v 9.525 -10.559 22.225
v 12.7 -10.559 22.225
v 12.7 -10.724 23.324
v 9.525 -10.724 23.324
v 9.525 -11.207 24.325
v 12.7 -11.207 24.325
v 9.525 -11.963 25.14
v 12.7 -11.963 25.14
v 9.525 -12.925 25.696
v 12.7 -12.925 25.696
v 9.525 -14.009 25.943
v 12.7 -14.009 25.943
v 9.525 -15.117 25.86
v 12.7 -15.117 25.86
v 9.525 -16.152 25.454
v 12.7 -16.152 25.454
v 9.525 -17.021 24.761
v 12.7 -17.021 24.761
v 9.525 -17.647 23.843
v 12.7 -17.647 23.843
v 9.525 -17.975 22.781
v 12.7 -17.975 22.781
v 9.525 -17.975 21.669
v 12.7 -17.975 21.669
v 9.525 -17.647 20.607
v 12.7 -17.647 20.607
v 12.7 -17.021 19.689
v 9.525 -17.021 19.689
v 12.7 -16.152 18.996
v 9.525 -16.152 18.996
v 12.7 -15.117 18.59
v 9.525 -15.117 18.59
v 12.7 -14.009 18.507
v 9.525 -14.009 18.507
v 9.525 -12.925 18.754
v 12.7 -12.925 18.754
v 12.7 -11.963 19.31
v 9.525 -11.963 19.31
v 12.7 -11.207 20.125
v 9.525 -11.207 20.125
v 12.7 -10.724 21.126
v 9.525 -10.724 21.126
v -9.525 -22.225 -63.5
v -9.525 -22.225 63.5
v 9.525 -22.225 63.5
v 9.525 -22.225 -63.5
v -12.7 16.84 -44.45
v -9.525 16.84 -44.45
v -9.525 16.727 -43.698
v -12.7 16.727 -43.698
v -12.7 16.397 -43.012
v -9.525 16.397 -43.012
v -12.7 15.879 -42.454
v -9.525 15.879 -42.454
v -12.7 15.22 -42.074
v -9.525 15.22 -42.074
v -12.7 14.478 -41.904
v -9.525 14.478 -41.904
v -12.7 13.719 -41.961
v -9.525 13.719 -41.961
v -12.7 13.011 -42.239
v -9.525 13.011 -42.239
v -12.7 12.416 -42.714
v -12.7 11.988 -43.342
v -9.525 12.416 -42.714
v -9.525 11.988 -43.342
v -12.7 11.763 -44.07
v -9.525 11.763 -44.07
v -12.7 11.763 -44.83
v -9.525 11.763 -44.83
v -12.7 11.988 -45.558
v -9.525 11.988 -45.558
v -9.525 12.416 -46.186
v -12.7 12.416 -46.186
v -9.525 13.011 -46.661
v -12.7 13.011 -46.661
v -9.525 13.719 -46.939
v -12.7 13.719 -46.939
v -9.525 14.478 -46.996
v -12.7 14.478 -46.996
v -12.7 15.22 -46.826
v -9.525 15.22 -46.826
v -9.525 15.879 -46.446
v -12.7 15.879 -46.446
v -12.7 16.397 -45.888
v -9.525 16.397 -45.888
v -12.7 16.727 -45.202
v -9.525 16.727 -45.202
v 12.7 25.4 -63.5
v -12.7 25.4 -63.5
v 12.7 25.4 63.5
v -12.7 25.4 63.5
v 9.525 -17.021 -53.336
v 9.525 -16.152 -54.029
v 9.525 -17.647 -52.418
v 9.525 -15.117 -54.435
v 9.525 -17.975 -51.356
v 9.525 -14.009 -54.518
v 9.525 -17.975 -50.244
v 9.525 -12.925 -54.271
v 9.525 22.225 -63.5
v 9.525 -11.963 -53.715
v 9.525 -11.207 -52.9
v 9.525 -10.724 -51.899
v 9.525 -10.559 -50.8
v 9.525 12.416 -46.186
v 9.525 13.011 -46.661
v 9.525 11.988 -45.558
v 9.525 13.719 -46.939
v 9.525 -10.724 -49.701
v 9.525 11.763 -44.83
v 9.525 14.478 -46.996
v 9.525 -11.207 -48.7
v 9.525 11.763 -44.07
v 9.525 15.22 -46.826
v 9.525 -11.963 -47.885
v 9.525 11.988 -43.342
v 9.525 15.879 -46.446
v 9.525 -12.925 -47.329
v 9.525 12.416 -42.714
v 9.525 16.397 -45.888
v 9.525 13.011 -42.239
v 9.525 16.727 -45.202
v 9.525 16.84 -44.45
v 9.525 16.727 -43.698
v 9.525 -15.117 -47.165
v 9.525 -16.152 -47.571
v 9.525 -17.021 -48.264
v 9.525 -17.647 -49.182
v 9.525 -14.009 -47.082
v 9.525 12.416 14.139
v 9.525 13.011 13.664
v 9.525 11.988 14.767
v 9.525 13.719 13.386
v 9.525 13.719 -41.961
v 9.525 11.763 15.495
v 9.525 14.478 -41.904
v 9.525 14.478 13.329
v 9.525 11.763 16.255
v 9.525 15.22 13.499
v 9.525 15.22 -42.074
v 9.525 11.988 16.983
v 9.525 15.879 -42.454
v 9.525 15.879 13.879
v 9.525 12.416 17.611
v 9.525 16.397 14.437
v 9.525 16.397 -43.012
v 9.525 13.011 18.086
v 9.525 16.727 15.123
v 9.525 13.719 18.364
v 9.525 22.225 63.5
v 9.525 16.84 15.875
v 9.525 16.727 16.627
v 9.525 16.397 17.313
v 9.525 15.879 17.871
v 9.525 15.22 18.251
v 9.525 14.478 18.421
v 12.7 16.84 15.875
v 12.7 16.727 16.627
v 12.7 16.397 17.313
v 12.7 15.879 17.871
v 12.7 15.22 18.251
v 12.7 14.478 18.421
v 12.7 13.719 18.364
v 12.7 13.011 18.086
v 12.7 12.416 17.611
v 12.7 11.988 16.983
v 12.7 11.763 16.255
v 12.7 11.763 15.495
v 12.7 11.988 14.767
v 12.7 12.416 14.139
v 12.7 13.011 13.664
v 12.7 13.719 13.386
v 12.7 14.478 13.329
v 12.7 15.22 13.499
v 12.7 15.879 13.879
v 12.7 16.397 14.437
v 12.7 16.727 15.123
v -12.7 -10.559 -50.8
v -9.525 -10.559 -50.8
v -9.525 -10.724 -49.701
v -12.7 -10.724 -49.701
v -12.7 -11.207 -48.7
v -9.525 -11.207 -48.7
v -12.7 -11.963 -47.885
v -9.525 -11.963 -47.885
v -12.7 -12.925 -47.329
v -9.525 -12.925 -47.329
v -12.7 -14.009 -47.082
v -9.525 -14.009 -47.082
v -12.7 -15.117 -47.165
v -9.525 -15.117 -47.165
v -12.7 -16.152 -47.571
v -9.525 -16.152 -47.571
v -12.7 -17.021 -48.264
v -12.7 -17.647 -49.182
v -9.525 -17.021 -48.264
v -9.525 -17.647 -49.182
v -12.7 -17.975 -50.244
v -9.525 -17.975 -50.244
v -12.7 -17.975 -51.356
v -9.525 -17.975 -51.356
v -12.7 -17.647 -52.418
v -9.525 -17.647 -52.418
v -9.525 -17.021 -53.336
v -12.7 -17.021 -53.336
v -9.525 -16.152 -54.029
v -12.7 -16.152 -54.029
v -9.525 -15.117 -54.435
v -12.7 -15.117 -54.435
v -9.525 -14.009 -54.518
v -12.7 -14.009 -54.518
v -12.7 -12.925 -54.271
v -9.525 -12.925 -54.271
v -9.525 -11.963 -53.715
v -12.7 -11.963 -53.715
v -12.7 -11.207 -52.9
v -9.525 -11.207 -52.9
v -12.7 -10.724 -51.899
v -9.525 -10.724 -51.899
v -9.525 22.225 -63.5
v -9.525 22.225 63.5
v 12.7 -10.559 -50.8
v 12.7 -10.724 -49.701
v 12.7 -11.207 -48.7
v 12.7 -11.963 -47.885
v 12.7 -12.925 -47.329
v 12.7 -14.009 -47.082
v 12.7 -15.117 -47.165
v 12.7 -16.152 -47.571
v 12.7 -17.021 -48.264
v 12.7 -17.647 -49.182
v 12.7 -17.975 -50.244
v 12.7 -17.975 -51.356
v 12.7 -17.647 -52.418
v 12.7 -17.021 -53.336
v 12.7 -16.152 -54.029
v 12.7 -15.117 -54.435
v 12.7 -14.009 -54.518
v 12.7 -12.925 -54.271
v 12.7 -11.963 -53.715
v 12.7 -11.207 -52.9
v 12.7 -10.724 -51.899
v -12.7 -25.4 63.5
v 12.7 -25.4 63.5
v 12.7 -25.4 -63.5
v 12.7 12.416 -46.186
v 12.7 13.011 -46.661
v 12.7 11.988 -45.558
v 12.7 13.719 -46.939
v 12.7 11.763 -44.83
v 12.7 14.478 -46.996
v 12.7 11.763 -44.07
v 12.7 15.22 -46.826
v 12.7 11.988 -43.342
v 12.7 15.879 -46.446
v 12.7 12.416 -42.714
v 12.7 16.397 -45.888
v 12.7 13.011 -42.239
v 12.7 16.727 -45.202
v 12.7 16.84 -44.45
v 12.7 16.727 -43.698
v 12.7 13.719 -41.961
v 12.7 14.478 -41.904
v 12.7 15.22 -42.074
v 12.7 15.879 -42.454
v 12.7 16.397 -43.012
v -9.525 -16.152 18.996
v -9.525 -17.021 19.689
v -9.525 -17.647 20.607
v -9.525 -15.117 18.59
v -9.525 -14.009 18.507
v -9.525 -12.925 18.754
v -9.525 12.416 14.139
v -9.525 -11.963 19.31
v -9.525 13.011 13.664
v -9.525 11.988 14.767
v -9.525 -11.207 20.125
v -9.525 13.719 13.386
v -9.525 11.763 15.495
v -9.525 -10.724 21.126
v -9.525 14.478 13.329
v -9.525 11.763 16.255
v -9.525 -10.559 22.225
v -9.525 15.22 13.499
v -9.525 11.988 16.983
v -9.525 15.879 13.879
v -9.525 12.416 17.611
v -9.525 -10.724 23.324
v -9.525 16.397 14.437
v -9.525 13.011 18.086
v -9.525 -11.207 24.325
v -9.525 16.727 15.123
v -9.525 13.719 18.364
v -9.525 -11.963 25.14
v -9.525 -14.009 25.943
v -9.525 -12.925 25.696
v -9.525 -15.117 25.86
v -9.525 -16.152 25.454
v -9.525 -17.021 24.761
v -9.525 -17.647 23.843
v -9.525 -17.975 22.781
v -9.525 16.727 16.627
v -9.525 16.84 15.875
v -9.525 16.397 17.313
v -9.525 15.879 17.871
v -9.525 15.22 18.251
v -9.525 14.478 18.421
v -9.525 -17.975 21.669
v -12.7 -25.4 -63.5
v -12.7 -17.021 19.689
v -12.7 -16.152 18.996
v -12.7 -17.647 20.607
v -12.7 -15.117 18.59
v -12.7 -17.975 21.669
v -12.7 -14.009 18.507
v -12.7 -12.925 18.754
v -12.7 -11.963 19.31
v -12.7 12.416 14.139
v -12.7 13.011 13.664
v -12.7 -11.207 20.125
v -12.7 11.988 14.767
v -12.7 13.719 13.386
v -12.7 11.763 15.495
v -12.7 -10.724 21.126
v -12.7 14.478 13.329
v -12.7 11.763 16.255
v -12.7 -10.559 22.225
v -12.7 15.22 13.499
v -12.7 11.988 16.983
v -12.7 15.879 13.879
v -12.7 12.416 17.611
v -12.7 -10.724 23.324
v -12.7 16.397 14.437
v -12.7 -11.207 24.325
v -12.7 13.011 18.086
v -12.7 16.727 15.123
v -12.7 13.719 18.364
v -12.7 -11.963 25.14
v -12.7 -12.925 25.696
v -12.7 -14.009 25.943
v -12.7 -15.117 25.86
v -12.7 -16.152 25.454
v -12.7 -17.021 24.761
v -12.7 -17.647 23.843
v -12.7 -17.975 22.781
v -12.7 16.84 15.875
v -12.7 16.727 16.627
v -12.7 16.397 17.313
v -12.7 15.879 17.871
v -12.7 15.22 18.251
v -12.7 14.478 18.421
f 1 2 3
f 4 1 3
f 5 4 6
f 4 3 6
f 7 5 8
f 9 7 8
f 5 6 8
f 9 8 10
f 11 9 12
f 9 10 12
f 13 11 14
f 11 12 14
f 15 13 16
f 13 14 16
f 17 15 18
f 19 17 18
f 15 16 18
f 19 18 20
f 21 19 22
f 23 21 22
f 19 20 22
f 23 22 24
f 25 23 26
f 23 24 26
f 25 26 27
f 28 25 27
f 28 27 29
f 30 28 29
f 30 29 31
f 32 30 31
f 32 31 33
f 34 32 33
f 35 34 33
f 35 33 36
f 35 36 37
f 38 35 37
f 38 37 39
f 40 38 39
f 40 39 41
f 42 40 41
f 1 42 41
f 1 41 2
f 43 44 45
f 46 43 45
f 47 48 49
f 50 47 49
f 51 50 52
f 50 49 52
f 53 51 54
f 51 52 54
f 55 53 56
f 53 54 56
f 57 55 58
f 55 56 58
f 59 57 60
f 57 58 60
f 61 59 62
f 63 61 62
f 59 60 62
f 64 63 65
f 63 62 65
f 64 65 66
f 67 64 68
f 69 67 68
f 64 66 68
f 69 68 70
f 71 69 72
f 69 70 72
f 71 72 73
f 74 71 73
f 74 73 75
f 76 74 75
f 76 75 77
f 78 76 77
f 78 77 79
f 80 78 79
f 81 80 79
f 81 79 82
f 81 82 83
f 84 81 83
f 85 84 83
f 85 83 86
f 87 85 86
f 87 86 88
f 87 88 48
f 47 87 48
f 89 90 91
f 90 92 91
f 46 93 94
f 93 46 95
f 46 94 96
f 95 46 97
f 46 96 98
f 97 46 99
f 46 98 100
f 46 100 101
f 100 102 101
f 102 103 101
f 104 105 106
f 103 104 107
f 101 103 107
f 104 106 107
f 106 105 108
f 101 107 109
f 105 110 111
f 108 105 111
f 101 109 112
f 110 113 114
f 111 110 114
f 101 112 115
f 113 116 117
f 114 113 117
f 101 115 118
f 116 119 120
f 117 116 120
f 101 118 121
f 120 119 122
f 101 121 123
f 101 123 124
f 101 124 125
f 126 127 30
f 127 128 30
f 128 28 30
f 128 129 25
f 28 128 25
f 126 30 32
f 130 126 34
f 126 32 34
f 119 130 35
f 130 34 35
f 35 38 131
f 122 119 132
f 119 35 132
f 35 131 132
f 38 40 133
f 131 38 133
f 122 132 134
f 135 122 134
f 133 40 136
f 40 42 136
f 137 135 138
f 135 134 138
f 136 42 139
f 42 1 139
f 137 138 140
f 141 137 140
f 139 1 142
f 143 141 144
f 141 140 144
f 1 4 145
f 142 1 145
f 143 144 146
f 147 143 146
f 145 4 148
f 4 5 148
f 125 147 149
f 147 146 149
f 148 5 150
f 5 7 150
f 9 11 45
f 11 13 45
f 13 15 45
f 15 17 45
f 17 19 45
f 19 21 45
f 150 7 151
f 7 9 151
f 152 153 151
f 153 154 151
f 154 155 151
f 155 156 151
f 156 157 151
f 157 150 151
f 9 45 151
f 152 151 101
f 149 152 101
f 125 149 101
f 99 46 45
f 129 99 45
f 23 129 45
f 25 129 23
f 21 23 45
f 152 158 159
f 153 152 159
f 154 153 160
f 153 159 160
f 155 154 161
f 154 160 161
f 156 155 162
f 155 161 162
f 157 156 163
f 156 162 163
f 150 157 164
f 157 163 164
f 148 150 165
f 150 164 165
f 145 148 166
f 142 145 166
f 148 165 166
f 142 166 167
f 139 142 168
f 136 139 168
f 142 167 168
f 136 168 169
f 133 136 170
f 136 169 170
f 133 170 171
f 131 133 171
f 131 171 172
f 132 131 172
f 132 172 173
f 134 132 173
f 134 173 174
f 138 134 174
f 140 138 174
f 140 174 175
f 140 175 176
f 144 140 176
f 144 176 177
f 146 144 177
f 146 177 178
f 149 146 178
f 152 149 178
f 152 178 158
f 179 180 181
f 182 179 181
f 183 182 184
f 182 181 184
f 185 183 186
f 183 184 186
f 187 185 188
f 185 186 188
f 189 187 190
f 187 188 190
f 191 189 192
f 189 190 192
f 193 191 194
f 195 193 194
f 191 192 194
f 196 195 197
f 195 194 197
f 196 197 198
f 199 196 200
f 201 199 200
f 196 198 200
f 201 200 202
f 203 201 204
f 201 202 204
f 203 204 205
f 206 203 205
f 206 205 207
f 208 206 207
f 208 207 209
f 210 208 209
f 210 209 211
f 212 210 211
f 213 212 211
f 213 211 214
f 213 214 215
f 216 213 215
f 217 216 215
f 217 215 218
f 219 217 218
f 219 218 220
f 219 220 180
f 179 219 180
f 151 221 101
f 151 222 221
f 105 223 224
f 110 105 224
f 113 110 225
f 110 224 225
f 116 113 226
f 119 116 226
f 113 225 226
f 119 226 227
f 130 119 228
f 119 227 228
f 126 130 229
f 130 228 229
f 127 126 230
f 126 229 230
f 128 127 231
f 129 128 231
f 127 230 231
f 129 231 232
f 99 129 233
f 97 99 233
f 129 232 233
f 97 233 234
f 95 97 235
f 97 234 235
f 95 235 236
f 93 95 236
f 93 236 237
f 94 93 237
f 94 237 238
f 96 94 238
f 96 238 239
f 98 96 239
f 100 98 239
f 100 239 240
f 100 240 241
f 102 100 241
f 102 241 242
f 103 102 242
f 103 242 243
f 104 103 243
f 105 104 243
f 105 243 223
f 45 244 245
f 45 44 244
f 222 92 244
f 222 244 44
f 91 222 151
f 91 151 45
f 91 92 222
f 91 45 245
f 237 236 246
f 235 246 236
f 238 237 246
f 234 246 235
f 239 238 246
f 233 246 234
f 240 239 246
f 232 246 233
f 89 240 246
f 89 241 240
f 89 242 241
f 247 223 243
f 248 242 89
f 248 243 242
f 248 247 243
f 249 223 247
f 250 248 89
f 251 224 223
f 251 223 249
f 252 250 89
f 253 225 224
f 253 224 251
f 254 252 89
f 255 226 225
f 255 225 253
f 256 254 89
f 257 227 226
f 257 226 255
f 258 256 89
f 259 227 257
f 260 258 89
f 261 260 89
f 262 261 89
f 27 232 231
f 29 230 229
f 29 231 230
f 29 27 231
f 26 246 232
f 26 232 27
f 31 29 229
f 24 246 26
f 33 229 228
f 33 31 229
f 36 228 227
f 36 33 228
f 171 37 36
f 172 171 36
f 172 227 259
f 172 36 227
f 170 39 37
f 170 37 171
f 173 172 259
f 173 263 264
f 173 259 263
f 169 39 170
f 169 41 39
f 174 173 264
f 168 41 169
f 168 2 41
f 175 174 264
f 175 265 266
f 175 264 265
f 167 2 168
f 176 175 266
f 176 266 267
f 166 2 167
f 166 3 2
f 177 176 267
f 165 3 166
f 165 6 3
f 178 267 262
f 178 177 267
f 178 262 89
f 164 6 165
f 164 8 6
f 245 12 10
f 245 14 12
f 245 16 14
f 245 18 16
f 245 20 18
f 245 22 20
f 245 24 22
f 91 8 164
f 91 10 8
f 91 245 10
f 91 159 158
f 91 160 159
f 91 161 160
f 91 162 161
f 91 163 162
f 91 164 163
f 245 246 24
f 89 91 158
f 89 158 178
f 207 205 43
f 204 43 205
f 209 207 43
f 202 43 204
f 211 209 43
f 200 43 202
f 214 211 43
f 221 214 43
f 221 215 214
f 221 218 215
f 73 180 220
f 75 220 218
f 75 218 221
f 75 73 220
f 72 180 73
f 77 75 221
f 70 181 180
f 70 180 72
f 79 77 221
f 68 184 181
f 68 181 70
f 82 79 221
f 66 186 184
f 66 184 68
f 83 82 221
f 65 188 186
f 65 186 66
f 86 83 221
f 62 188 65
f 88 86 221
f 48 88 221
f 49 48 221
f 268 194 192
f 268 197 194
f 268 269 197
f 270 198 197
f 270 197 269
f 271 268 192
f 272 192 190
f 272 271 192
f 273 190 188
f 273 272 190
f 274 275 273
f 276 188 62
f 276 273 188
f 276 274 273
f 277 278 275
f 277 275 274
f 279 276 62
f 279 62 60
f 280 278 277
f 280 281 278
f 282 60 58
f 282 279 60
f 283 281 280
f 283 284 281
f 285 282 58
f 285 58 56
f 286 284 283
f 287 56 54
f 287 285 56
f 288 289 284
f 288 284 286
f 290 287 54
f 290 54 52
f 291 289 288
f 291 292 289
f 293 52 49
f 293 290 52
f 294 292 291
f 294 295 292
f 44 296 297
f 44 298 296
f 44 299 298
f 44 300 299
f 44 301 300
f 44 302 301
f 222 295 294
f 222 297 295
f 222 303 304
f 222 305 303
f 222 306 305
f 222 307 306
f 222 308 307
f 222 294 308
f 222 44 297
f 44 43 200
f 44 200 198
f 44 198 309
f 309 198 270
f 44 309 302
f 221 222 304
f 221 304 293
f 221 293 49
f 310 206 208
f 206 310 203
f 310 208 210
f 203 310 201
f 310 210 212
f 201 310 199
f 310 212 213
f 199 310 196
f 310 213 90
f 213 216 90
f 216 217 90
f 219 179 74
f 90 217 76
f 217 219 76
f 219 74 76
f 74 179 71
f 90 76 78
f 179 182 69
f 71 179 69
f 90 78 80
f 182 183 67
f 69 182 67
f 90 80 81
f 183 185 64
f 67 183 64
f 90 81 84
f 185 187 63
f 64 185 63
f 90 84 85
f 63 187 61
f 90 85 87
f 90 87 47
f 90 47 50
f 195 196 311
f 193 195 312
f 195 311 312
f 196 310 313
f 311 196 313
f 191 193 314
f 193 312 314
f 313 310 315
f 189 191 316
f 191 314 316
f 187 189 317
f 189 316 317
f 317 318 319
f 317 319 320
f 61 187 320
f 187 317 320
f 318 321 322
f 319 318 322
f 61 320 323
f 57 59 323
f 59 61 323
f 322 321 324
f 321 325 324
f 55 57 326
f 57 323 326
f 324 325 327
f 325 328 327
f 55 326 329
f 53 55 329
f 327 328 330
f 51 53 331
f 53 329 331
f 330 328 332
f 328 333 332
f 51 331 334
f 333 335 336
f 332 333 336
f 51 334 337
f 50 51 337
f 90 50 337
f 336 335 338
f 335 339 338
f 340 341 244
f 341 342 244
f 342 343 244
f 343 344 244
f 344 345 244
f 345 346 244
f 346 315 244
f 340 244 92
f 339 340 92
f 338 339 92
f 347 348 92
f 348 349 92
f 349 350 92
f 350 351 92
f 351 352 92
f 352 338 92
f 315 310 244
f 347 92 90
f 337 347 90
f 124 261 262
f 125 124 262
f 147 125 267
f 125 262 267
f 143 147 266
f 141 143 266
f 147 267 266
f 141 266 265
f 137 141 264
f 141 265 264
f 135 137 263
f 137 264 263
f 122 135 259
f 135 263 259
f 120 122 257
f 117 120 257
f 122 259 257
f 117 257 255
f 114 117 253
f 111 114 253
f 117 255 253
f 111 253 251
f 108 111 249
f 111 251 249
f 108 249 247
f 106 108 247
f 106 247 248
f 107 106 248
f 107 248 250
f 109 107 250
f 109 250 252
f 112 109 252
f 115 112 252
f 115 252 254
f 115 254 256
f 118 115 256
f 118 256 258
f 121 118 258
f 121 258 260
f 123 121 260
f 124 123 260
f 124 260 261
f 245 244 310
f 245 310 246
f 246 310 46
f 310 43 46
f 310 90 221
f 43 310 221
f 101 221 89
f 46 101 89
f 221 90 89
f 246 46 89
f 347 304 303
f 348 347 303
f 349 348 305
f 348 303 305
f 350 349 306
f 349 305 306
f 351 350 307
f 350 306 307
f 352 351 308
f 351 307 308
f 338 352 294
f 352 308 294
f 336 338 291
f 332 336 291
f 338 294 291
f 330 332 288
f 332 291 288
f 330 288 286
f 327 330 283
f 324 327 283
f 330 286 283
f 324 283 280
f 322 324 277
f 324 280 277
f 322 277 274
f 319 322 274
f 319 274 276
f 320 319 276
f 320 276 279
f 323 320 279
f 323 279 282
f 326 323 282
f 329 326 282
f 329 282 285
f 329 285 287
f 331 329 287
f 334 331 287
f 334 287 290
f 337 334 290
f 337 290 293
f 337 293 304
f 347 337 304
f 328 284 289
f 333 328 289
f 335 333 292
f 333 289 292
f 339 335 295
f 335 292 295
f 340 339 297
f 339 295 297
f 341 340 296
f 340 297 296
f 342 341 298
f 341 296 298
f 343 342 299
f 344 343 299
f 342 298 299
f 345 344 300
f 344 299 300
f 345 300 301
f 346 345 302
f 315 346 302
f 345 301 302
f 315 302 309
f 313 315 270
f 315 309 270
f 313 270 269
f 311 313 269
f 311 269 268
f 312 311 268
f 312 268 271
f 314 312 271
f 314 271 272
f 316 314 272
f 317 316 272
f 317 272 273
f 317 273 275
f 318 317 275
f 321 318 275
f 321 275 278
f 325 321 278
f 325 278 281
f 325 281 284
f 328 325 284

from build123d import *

# Parameters (mm, degrees)
SKETCH1_W           = 25.4
SKETCH1_H           = 50.8
SKETCH1_W_2         = 19.05
SKETCH1_H_2         = 44.45
BOSS_EXTRUDE1_DEPTH = 63.5
SKETCH3_R           = 3.72872
SKETCH3_R_2         = 2.5527
CUT_EXTRUDE1_DEPTH  = 73.955945611


with BuildPart() as part:
    # Sketch1 → Boss-Extrude1 (new, symmetric)
    with BuildSketch(Plane.XY):
        Rectangle(SKETCH1_W, SKETCH1_H)
        Rectangle(SKETCH1_W_2, SKETCH1_H_2, mode=Mode.SUBTRACT)
    extrude(amount=BOSS_EXTRUDE1_DEPTH, both=True)

    # Sketch3 → Cut-Extrude1 (cut, through all)
    with BuildSketch(Plane(origin=(12.7, 0, 0), x_dir=(0, 0, -1), z_dir=(1, 0, 0))):
        with Locations(Location((50.8, -14.2875, 0), (0, 0, 90))):
            Circle(SKETCH3_R)
        with Locations(Location((-22.225, -14.2875, 0), (0, 0, 90))):
            Circle(SKETCH3_R)
        with Locations(Location((44.45, 14.2875, 0), (0, 0, 90))):
            Circle(SKETCH3_R_2)
        with Locations(Location((-15.875, 14.2875, 0), (0, 0, 90))):
            Circle(SKETCH3_R_2)
    extrude(amount=-CUT_EXTRUDE1_DEPTH, mode=Mode.SUBTRACT)


solid = part.part
